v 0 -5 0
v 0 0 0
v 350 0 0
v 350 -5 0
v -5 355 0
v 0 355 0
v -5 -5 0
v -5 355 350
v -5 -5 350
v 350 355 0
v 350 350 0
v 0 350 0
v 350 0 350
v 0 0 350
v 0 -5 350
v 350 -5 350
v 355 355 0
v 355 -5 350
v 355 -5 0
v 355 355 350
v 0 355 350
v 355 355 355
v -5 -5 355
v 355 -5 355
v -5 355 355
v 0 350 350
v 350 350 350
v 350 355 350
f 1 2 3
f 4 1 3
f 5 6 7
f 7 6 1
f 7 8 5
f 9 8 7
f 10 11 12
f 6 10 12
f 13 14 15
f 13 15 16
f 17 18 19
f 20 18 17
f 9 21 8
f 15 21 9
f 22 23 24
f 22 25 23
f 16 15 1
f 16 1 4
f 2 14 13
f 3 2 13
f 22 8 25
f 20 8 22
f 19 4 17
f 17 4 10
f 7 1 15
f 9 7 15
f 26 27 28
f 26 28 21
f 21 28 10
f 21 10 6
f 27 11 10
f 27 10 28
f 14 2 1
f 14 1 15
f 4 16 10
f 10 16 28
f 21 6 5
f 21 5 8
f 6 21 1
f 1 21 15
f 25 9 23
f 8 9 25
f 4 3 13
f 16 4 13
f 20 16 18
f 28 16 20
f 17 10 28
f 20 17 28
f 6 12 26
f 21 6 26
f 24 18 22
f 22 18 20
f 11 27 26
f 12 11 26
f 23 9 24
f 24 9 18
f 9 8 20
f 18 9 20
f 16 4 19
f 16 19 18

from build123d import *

# Parameters (mm, degrees)
F3_W        = 350
F3_H        = 350
F10_DEPTH   = 5
F5_W        = 350
F5_H        = 350
F11_DEPTH   = 5
F10_FACE_W  = 5
F10_FACE_H  = 350
F7_W        = 350
F7_H        = 350
F11_FACE_W  = 5
F11_FACE_H  = 350
F12_DEPTH   = 5
F2_W        = 350
F2_H        = 350
F11_FACE1_W = 5
F11_FACE1_H = 350
F10_FACE1_W = 5
F10_FACE1_H = 350
F14_DEPTH   = 5
F15_FACE_W  = 5
F15_FACE_H  = 360
F9_W        = 350
F9_H        = 350
F11_FACE2_W = 350
F11_FACE2_H = 5
F13_FACE_W  = 5
F13_FACE_H  = 360
F10_FACE2_W = 350
F10_FACE2_H = 5
F16_DEPTH   = 5


with BuildPart() as f10:
    # F3 (on Front) → F10 (new body)
    with BuildSketch(Plane.XZ):
        with Locations((175, 175)):
            Rectangle(F3_W, F3_H)
    extrude(amount=F10_DEPTH)


with BuildPart() as f11:
    # F5 (on 3pt) → F11 (new body)
    with BuildSketch(Plane(origin=(0, 350, 0), x_dir=(-1, 0, 0), z_dir=(0, 1, 0))):
        with Locations((-175, 175)):
            Rectangle(F5_W, F5_H)
    extrude(amount=F11_DEPTH)


with BuildPart() as f12:
    # F10_face (on face) + F7 (on 3pt) + F11_face (on face) → F12 (new body)
    with BuildSketch(Plane(origin=(350, -2.5, 175), x_dir=(0, 1, 0), z_dir=(1, 0, 0))):
        Rectangle(F10_FACE_W, F10_FACE_H)
    with BuildSketch(Plane.YZ.offset(350)):
        with Locations((175, 175)):
            Rectangle(F7_W, F7_H)
    with BuildSketch(Plane(origin=(350, 352.5, 175), x_dir=(0, 1, 0), z_dir=(1, 0, 0))):
        Rectangle(F11_FACE_W, F11_FACE_H)
    extrude(amount=F12_DEPTH)

    # F13: union 


with BuildPart() as f14:
    # F2 (on Right) + F11_face1 (on face) + F10_face1 (on face) → F14 (new body)
    with BuildSketch(Plane.YZ):
        with Locations((175, 175)):
            Rectangle(F2_W, F2_H)
    with BuildSketch(Plane(origin=(0, 352.5, 175), x_dir=(0, -1, 0), z_dir=(-1, 0, 0))):
        Rectangle(F11_FACE1_W, F11_FACE1_H)
    with BuildSketch(Plane(origin=(0, -2.5, 175), x_dir=(0, -1, 0), z_dir=(-1, 0, 0))):
        Rectangle(F10_FACE1_W, F10_FACE1_H)
    extrude(amount=-F14_DEPTH, dir=(1, 0, 0))

    # F15: union 


with BuildPart() as f16:
    # F15_face (on face) + F9 (on 3pt) + F11_face2 (on face) + F13_face (on face) + F10_face2 (on face) → F16 (new body)
    with BuildSketch(Plane(origin=(-2.5, 175, 350), x_dir=(1, 0, 0), z_dir=(0, 0, 1))):
        Rectangle(F15_FACE_W, F15_FACE_H)
    with BuildSketch(Plane(origin=(0, 0, 350), x_dir=(1, 0, 0), z_dir=(0, 0, -1))):
        with Locations((175, -175)):
            Rectangle(F9_W, F9_H)
    with BuildSketch(Plane(origin=(175, 352.5, 350), x_dir=(1, 0, 0), z_dir=(0, 0, 1))):
        Rectangle(F11_FACE2_W, F11_FACE2_H)
    with BuildSketch(Plane(origin=(352.5, 175, 350), x_dir=(1, 0, 0), z_dir=(0, 0, 1))):
        Rectangle(F13_FACE_W, F13_FACE_H)
    with BuildSketch(Plane(origin=(175, -2.5, 350), x_dir=(1, 0, 0), z_dir=(0, 0, 1))):
        Rectangle(F10_FACE2_W, F10_FACE2_H)
    extrude(amount=F16_DEPTH, dir=(0, 0, 1))


solid = Compound([f10.part, f11.part, f12.part, f14.part, f16.part])
